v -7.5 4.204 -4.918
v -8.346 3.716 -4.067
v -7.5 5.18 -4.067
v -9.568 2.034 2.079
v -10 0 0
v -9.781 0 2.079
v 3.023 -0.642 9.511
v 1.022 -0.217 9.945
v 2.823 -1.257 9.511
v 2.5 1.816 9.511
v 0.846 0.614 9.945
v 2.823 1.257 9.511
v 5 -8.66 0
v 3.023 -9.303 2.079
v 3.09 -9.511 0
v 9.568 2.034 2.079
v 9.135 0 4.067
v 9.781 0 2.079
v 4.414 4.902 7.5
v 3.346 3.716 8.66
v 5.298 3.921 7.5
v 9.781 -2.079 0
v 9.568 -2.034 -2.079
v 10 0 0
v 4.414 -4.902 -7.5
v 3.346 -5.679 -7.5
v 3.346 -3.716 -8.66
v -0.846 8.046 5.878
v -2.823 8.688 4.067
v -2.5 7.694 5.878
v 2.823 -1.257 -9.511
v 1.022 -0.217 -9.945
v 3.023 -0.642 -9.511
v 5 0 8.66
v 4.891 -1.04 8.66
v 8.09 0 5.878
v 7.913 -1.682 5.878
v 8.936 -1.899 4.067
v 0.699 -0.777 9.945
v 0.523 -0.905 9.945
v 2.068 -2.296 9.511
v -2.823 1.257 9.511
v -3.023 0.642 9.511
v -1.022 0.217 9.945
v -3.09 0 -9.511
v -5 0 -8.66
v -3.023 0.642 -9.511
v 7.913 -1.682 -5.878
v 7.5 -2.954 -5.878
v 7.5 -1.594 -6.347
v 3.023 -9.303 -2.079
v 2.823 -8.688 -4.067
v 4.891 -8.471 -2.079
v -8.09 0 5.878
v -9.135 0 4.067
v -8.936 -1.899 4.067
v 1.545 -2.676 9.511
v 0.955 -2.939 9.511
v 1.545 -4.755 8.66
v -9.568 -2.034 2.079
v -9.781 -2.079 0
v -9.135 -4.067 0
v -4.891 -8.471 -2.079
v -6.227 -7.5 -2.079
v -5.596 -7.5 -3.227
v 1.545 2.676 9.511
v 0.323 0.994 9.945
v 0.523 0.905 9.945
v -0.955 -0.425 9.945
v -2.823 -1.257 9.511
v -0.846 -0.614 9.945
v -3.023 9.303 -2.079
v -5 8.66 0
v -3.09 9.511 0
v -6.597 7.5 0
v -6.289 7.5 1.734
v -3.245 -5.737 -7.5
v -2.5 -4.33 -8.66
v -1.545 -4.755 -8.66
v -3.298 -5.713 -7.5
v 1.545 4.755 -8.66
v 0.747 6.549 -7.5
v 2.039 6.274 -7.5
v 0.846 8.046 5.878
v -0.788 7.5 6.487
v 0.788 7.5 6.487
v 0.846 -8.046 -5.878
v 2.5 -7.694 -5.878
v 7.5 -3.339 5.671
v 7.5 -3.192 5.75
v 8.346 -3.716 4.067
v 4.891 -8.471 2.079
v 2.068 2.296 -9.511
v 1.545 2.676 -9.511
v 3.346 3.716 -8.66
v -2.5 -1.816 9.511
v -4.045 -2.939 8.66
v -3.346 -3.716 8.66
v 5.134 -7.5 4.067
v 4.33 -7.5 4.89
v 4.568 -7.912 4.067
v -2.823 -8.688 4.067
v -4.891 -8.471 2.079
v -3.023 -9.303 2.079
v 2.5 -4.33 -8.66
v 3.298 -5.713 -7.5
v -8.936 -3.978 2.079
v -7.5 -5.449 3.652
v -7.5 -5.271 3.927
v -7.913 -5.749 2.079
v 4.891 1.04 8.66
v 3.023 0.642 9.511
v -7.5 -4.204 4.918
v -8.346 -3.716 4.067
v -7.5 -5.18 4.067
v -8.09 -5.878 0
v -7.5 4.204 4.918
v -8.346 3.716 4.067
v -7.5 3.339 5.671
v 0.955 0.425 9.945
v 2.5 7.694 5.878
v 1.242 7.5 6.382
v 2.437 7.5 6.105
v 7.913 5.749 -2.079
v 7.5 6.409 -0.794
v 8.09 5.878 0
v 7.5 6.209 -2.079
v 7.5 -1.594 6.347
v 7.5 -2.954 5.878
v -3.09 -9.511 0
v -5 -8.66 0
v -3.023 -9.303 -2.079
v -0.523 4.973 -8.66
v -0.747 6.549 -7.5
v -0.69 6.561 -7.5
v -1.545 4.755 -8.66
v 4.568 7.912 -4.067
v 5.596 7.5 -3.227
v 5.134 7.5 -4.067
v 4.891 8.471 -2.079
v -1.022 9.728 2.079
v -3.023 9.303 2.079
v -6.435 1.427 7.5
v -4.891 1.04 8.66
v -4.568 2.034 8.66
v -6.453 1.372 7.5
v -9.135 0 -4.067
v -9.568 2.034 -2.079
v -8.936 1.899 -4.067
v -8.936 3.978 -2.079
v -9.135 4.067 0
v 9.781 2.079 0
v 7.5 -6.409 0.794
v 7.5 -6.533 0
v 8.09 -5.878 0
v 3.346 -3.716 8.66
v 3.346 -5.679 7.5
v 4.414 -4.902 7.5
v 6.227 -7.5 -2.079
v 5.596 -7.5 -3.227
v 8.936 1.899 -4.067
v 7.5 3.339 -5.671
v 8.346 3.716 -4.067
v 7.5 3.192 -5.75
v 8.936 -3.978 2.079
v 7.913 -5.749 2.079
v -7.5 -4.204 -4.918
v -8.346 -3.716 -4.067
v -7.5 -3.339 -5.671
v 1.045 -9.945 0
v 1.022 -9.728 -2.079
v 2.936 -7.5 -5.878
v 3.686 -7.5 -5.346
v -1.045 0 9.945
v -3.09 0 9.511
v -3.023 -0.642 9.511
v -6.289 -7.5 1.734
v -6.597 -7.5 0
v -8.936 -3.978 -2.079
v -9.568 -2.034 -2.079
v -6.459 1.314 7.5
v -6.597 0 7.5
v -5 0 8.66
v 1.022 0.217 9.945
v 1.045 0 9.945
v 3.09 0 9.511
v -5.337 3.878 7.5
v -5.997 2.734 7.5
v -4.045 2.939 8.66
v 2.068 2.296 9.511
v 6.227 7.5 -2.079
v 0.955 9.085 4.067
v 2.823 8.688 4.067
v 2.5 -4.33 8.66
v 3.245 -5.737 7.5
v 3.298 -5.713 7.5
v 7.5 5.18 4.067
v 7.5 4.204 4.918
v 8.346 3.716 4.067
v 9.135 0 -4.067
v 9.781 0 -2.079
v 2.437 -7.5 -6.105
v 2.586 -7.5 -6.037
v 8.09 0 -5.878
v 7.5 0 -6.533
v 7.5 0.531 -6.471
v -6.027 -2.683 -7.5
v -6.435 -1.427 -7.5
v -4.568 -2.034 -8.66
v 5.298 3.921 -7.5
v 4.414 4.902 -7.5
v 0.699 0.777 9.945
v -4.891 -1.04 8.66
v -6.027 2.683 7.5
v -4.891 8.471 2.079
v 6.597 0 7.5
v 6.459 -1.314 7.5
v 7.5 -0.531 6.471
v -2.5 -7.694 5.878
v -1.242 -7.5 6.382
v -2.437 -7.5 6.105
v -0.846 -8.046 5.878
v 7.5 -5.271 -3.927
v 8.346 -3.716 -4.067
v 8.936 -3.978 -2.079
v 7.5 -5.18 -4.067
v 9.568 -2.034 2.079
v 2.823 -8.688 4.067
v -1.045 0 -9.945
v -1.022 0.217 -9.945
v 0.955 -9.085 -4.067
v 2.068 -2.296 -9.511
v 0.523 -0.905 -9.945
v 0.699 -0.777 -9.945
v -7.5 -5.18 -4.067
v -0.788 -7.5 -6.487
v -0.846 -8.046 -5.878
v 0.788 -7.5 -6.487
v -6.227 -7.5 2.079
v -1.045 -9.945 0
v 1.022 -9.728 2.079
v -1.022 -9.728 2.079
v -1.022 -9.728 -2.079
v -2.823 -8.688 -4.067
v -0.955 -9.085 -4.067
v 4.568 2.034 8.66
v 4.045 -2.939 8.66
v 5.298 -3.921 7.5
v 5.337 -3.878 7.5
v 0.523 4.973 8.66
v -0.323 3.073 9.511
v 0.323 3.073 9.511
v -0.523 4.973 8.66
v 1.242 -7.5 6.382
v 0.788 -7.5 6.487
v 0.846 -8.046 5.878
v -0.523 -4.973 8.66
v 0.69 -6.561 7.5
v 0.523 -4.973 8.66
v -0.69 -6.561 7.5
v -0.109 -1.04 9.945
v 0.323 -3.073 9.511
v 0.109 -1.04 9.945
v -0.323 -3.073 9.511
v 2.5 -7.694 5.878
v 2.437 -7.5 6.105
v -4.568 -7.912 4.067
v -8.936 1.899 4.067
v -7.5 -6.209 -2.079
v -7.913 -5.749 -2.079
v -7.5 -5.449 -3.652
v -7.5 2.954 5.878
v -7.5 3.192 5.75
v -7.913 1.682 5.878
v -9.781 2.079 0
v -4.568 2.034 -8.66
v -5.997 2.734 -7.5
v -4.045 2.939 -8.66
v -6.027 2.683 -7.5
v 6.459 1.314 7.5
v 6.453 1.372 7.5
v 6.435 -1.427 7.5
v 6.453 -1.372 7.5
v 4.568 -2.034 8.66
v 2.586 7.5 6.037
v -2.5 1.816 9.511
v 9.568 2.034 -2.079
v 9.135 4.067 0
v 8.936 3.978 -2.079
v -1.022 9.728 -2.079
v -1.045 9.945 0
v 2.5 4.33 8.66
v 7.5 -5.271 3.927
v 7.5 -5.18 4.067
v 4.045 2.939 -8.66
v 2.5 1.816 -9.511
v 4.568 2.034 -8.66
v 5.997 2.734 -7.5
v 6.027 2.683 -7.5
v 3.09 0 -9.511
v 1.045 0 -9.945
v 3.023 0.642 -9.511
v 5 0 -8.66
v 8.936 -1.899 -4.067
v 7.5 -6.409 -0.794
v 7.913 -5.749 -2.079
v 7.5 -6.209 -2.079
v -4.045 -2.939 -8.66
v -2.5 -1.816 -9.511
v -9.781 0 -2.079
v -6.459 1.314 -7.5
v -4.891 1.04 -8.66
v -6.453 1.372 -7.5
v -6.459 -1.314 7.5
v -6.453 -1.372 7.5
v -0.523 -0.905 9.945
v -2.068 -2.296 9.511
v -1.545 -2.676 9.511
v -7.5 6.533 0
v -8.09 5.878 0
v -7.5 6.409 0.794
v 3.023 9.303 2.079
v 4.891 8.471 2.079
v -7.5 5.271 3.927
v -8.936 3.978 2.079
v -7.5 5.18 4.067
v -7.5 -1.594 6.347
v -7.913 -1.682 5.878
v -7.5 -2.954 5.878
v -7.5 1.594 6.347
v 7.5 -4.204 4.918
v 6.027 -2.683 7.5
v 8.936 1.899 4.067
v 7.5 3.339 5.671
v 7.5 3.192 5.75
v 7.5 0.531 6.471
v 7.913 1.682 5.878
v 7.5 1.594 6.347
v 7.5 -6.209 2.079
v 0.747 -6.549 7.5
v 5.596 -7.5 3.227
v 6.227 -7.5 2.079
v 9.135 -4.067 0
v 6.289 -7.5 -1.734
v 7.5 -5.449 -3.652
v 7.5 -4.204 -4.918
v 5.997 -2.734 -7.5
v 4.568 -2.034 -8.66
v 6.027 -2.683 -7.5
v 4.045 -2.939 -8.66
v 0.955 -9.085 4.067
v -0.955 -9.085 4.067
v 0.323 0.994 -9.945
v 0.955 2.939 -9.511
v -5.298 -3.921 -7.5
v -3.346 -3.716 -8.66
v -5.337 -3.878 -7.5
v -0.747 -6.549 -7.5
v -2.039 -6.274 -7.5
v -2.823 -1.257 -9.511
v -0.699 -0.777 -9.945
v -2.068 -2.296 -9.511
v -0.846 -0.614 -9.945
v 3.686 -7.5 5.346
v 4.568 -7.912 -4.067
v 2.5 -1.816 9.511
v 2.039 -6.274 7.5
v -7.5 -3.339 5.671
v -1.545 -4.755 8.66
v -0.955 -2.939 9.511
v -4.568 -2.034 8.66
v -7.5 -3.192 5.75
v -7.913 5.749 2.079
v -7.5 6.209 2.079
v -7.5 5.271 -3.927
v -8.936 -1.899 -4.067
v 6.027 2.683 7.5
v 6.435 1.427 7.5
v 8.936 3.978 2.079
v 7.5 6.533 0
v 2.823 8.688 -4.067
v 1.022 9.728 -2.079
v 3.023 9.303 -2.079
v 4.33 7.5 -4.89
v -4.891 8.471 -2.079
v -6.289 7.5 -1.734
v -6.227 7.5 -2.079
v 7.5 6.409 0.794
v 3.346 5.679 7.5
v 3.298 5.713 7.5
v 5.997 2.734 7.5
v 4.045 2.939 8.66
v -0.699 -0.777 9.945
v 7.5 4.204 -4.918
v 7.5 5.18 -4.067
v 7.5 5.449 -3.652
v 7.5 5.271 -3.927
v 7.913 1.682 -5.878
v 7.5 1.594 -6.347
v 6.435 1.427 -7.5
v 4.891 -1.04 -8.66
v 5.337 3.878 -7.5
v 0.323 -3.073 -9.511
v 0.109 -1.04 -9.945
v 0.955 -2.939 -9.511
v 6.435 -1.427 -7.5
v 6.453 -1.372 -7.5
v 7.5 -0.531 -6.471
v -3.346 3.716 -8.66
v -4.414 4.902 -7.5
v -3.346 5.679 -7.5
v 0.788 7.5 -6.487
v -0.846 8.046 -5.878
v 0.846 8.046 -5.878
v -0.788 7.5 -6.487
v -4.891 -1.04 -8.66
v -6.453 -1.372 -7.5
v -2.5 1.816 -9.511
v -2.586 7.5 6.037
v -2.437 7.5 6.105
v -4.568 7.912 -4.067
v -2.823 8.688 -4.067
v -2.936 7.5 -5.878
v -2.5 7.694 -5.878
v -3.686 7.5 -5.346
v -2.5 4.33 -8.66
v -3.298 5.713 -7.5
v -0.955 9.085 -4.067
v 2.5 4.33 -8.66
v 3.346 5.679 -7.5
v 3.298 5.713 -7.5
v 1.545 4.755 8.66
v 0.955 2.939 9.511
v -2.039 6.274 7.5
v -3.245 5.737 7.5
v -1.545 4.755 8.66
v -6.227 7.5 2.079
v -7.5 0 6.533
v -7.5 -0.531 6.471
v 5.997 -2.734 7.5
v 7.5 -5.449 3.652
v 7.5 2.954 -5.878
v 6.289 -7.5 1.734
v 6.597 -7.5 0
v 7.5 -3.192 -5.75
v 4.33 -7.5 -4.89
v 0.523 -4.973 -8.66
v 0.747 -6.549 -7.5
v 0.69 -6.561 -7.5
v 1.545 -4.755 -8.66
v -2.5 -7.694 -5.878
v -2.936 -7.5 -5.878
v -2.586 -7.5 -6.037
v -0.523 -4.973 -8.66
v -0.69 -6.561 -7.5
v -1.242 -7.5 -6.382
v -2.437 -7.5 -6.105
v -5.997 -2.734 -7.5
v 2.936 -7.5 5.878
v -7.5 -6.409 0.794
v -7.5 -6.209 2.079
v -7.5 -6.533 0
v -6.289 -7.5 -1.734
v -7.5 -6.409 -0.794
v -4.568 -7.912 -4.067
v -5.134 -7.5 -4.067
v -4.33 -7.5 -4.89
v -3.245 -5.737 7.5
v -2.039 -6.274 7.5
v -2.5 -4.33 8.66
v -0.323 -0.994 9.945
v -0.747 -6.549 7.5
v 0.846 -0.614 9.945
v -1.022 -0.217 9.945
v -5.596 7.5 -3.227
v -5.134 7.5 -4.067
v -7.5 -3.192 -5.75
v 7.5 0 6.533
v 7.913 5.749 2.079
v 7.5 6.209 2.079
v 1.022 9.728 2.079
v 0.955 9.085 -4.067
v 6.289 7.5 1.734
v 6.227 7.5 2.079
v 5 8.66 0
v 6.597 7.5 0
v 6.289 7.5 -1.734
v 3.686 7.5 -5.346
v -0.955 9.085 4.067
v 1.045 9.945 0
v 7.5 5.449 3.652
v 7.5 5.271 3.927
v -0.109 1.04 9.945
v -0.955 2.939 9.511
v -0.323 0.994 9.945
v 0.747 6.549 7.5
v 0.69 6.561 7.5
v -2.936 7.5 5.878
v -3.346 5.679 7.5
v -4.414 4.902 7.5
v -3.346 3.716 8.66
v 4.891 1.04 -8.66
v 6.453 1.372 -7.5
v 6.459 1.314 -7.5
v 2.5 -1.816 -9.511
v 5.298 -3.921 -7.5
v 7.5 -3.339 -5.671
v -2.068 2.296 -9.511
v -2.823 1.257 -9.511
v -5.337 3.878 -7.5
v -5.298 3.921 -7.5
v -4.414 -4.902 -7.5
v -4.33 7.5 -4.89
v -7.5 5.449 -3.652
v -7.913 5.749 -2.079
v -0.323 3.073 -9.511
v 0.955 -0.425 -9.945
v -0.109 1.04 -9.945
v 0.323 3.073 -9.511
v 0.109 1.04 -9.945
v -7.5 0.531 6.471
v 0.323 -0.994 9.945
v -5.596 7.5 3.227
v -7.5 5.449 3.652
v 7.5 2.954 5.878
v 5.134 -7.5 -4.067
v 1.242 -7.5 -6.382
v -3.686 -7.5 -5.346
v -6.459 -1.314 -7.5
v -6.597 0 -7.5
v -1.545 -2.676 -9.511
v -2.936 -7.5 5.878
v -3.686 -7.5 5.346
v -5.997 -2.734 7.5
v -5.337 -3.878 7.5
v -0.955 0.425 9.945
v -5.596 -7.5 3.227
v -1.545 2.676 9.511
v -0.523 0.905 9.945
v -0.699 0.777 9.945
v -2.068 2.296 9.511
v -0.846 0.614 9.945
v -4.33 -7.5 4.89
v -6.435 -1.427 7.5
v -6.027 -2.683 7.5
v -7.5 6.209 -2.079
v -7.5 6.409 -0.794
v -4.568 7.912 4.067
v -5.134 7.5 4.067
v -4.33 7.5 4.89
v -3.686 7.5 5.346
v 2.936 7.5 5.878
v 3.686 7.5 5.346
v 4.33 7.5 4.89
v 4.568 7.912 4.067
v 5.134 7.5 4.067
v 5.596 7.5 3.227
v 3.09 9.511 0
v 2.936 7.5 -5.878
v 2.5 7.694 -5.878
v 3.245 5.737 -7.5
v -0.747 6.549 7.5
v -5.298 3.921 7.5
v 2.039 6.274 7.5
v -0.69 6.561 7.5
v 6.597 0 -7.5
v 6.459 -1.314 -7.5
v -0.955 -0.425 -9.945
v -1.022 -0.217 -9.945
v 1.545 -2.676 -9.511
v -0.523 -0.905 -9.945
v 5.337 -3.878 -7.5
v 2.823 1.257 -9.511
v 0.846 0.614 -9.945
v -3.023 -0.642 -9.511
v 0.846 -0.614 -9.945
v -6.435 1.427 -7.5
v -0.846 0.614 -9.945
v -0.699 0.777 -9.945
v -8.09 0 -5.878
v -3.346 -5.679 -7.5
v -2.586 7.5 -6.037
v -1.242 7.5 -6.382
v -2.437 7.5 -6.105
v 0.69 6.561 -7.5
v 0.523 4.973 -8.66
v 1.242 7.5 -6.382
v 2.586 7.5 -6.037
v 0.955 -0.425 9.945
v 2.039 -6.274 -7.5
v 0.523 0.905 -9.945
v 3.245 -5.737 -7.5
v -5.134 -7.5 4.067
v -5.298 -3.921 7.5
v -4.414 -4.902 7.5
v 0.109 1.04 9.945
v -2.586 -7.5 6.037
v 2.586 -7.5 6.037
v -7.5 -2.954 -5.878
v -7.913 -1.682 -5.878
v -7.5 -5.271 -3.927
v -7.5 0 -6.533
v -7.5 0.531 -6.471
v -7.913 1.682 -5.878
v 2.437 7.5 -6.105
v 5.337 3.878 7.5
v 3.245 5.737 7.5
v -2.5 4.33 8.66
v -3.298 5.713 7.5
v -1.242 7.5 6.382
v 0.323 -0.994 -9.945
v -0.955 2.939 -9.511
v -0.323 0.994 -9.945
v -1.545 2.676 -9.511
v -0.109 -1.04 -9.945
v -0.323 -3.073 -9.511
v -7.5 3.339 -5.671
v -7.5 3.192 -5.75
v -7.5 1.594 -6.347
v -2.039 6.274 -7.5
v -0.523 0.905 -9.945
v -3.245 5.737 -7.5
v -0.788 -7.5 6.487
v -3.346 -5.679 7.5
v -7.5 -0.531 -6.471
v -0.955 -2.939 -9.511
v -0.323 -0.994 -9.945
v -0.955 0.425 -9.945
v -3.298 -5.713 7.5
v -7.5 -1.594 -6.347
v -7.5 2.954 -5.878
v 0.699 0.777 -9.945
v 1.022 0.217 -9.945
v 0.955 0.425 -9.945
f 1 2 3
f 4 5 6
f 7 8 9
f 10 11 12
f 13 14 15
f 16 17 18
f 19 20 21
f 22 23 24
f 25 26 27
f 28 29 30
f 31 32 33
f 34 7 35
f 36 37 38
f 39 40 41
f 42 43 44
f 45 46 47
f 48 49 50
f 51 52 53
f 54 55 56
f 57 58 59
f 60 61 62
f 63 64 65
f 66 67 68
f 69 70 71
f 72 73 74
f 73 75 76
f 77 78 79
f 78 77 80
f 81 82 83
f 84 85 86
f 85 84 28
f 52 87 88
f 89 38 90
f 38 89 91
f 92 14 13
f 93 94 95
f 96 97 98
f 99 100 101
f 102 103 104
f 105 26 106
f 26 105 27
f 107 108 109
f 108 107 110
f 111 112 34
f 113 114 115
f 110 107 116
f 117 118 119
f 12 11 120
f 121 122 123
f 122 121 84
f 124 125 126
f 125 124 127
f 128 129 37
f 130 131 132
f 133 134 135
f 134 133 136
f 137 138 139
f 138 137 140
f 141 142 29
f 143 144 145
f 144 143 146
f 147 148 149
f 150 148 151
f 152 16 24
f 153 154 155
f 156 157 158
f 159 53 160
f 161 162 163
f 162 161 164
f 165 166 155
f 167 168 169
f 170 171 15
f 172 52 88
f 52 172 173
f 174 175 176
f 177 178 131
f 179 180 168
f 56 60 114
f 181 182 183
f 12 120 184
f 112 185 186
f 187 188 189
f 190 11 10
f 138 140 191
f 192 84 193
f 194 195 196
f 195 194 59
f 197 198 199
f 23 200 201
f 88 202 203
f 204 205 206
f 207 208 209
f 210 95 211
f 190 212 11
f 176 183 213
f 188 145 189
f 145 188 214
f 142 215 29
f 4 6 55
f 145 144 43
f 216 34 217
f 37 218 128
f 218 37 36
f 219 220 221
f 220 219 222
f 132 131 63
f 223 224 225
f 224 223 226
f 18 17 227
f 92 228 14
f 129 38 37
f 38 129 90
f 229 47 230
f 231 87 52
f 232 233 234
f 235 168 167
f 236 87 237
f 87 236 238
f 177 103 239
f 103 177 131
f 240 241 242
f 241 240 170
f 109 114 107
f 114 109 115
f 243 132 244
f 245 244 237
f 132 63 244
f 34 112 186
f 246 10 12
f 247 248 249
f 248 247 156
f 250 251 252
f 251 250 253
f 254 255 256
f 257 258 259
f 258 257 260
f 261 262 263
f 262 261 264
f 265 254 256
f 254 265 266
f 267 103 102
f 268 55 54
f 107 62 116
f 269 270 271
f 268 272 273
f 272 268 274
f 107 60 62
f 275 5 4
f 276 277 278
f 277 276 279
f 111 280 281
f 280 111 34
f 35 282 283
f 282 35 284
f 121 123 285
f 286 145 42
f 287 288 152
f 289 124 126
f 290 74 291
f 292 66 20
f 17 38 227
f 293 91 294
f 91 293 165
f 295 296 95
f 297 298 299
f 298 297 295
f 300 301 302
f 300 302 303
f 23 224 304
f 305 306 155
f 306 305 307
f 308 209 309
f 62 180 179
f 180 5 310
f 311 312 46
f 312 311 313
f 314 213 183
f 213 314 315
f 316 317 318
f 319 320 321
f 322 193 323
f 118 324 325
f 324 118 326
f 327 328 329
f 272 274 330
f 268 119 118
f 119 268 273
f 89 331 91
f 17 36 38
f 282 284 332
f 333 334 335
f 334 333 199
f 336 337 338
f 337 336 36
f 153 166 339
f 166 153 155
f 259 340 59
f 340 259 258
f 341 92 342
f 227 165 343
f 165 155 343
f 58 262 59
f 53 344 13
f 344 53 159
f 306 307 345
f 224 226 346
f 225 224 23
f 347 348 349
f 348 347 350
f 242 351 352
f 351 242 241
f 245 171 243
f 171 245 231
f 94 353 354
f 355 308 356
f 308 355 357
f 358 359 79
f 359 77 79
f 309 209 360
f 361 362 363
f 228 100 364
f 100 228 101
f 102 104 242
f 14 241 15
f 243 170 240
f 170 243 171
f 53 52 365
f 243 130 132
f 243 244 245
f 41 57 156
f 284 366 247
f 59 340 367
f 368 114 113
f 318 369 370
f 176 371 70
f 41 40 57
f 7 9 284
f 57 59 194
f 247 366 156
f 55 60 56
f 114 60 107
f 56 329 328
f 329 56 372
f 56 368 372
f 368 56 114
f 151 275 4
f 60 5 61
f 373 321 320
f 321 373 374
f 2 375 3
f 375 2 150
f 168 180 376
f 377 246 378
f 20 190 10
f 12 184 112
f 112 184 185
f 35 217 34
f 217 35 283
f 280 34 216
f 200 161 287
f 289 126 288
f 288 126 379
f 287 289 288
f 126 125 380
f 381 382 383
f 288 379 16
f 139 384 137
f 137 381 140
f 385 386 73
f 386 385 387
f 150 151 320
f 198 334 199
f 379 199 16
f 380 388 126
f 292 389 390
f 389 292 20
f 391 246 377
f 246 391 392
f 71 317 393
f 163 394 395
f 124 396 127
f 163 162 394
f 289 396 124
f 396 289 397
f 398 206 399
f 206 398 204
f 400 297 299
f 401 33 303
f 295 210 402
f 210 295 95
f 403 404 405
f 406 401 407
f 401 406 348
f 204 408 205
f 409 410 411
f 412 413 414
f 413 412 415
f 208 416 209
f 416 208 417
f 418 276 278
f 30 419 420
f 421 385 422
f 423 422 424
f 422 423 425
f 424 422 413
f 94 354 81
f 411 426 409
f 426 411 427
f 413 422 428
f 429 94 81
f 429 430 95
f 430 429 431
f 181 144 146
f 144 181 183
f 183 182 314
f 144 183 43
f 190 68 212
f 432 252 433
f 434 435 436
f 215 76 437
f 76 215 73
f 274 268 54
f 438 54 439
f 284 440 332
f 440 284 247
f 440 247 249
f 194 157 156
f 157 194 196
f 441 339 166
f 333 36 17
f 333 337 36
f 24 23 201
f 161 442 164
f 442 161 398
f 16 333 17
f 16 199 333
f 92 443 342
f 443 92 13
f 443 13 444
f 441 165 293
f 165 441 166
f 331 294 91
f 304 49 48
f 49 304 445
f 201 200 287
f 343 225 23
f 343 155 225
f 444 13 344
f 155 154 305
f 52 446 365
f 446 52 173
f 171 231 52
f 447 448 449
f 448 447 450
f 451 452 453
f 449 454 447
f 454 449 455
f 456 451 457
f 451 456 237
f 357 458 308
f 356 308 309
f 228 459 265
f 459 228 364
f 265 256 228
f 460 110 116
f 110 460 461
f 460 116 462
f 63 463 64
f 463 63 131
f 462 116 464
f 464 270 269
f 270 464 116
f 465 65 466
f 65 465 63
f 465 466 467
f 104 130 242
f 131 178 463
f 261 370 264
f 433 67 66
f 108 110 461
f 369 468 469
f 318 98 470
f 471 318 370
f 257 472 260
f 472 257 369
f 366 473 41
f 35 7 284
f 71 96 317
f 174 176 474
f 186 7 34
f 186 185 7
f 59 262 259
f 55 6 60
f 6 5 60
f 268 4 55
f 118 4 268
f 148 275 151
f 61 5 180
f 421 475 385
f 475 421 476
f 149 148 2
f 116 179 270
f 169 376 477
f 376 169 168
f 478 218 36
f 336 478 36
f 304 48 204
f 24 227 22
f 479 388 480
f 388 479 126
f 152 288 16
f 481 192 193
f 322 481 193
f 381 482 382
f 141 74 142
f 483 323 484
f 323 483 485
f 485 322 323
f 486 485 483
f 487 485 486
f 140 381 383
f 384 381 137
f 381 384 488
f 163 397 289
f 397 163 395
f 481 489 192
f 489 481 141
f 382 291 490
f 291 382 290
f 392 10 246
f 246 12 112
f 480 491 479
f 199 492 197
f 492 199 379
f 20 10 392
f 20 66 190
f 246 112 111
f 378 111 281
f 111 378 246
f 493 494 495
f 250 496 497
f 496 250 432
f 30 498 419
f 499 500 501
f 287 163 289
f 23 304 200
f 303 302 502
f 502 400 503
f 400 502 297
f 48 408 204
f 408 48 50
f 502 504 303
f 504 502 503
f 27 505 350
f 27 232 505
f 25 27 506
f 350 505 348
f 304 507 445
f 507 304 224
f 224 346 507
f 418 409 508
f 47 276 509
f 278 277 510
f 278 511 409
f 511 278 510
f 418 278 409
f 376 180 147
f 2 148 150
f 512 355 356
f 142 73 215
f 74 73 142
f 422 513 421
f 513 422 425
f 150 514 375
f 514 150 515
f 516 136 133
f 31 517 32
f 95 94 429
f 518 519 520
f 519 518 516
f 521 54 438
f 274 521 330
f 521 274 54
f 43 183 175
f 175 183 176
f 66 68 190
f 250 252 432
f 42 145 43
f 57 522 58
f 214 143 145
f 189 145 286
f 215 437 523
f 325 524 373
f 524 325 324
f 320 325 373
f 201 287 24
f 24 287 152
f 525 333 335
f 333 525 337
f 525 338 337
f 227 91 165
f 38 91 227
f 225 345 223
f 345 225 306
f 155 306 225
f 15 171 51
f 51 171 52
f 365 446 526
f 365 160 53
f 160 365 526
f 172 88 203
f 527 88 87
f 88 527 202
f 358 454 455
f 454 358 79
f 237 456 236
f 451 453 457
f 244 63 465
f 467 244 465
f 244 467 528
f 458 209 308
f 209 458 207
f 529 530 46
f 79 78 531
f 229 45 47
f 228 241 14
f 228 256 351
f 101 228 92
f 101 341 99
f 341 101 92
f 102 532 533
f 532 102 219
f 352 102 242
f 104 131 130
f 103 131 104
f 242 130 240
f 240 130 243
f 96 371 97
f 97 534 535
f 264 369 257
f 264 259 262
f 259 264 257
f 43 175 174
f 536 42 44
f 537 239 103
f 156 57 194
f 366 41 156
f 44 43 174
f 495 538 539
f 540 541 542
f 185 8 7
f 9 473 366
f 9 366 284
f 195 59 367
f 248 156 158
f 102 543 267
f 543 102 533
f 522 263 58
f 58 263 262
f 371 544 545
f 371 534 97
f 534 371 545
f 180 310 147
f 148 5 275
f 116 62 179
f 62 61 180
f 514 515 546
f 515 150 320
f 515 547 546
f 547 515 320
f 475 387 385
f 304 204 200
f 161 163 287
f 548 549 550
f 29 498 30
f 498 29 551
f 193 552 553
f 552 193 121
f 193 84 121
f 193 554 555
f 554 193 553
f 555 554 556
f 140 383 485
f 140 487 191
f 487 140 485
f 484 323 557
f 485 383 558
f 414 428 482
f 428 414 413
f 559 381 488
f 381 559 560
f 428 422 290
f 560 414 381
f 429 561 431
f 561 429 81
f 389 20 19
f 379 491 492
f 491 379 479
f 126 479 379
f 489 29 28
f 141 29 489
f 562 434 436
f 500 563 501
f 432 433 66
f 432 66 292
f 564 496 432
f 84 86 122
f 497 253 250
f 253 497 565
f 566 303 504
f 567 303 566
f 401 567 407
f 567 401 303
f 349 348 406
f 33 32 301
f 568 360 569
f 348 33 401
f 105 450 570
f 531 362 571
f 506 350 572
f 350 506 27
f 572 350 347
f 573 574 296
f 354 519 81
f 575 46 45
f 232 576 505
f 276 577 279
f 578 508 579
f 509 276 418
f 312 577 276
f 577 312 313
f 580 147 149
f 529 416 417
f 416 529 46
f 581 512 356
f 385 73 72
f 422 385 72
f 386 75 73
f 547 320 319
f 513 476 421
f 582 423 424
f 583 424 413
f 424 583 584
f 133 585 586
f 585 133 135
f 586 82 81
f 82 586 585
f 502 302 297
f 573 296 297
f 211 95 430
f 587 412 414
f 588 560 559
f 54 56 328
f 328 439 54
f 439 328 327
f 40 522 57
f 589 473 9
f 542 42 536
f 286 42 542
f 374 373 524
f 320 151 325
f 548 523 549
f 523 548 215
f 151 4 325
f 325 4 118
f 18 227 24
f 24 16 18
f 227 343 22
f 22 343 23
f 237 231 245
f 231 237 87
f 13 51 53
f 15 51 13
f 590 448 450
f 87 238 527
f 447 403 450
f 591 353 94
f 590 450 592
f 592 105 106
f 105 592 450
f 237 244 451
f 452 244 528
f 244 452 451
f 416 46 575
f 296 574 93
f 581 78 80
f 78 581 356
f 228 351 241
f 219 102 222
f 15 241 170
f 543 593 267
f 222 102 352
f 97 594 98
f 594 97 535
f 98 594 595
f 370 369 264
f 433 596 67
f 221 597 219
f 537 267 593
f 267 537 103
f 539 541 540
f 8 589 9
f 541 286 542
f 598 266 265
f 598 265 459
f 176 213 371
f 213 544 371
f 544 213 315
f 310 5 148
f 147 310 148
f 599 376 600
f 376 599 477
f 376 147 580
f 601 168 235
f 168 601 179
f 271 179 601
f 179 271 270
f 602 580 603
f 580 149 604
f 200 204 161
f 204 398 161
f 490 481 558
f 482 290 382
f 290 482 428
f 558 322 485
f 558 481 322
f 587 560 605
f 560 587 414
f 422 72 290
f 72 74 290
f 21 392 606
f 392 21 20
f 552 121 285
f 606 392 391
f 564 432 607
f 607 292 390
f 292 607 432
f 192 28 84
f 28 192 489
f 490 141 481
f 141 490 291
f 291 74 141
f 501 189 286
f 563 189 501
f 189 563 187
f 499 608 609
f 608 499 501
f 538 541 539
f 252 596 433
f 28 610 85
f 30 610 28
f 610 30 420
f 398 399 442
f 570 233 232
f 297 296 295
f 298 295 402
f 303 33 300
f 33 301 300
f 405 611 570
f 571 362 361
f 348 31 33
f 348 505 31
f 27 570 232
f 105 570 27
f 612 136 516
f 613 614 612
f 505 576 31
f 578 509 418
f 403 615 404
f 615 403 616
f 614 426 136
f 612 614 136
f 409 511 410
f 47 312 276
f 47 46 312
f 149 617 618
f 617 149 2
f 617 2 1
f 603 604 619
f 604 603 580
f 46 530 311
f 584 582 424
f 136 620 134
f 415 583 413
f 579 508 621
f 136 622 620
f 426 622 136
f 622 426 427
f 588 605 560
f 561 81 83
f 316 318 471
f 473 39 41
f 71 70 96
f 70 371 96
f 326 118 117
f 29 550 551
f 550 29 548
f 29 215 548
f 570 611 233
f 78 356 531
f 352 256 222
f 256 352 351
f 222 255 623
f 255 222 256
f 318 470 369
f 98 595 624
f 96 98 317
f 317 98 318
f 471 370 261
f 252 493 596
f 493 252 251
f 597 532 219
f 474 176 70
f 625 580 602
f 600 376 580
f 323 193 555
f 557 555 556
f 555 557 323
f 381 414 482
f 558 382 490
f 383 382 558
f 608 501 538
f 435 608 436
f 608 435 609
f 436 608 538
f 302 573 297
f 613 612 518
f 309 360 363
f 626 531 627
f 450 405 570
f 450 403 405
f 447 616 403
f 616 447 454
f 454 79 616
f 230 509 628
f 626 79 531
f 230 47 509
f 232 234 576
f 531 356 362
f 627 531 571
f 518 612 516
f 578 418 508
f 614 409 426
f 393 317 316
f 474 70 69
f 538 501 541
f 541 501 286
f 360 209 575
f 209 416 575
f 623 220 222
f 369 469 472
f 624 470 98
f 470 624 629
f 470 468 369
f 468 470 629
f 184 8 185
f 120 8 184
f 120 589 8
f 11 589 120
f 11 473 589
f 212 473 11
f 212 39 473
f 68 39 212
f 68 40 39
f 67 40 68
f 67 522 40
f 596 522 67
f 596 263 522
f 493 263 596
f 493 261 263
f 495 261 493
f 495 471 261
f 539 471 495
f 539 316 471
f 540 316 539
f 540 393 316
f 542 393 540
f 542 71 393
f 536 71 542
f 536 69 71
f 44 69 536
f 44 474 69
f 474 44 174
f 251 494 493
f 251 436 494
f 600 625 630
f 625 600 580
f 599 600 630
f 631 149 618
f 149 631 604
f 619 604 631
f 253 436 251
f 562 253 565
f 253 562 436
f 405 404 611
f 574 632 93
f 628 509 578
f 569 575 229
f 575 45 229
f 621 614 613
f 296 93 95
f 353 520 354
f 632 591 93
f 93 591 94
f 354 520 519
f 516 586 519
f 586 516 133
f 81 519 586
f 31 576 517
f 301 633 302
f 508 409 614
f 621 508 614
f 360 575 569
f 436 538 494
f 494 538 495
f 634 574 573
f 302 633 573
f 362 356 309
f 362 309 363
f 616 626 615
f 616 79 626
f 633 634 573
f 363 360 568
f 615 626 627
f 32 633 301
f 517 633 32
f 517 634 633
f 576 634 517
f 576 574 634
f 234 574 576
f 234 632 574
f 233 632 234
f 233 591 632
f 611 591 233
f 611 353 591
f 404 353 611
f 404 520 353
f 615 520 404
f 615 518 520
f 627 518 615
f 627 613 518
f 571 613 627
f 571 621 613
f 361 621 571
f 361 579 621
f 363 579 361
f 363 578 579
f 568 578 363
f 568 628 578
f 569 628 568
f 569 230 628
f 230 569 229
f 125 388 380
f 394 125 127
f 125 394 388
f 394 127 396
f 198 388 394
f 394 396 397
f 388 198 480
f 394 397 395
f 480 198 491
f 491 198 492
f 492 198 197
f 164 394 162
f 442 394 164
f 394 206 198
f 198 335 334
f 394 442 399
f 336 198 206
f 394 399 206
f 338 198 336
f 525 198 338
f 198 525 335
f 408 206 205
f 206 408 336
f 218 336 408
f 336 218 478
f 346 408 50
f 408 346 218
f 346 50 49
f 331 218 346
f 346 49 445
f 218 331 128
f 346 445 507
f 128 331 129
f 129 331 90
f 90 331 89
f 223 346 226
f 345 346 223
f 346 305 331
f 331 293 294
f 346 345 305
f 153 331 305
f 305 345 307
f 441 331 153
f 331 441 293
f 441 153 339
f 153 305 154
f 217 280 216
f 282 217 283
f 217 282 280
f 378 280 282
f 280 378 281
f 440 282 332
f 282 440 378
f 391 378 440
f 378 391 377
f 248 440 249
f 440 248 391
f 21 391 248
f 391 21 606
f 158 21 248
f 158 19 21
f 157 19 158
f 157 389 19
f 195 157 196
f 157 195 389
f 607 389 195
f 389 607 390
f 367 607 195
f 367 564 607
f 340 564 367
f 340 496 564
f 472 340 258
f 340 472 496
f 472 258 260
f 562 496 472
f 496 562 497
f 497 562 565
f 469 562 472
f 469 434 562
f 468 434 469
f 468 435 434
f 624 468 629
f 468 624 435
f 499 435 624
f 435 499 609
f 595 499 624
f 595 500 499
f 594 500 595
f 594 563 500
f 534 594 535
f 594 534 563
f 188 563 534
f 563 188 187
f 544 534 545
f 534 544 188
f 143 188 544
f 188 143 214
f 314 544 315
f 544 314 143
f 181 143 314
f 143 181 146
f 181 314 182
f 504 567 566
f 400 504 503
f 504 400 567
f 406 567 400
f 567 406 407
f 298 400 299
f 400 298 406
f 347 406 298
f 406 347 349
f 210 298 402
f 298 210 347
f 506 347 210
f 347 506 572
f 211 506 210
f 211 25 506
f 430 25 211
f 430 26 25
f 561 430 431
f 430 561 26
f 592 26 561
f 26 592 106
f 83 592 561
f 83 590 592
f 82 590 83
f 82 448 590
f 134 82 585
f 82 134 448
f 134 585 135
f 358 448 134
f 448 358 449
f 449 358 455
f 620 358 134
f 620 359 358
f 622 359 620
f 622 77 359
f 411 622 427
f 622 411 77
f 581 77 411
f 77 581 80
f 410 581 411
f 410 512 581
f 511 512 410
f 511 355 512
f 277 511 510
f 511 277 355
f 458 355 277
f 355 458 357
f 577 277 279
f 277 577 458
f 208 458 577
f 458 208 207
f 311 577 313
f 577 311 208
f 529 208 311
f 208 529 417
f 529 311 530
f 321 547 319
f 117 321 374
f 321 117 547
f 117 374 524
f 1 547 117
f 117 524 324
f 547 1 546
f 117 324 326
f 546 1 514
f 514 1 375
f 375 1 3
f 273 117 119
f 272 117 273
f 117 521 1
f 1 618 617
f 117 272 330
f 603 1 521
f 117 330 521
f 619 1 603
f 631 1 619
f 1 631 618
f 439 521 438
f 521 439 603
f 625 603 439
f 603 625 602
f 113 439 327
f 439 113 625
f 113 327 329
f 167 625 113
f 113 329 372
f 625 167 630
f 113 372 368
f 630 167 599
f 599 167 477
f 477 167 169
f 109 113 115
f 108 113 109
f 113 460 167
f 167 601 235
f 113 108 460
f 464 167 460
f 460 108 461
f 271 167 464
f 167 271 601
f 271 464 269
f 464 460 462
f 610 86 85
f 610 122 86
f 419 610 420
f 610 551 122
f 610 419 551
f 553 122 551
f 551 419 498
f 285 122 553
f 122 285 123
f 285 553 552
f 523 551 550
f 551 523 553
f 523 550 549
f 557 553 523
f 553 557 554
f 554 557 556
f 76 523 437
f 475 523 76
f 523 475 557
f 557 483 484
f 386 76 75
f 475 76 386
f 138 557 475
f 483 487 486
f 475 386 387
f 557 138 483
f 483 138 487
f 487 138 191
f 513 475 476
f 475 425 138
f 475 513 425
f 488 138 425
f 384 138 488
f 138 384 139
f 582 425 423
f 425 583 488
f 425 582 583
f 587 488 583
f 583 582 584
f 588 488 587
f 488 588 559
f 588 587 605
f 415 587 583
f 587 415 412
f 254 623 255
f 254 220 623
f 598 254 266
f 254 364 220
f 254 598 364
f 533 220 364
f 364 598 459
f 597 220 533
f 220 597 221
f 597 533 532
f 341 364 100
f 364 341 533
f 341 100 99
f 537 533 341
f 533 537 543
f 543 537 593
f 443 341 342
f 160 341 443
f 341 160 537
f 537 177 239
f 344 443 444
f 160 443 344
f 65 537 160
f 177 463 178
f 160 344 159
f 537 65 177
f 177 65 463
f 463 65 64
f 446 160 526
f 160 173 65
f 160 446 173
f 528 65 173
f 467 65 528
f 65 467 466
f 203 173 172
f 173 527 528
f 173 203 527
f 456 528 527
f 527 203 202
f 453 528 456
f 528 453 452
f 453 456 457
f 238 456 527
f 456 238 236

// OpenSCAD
$fn = 30;

module button() {
  difference() {
    sphere(10);
    color("red") cube(15, center = true);
  }
}

button();
